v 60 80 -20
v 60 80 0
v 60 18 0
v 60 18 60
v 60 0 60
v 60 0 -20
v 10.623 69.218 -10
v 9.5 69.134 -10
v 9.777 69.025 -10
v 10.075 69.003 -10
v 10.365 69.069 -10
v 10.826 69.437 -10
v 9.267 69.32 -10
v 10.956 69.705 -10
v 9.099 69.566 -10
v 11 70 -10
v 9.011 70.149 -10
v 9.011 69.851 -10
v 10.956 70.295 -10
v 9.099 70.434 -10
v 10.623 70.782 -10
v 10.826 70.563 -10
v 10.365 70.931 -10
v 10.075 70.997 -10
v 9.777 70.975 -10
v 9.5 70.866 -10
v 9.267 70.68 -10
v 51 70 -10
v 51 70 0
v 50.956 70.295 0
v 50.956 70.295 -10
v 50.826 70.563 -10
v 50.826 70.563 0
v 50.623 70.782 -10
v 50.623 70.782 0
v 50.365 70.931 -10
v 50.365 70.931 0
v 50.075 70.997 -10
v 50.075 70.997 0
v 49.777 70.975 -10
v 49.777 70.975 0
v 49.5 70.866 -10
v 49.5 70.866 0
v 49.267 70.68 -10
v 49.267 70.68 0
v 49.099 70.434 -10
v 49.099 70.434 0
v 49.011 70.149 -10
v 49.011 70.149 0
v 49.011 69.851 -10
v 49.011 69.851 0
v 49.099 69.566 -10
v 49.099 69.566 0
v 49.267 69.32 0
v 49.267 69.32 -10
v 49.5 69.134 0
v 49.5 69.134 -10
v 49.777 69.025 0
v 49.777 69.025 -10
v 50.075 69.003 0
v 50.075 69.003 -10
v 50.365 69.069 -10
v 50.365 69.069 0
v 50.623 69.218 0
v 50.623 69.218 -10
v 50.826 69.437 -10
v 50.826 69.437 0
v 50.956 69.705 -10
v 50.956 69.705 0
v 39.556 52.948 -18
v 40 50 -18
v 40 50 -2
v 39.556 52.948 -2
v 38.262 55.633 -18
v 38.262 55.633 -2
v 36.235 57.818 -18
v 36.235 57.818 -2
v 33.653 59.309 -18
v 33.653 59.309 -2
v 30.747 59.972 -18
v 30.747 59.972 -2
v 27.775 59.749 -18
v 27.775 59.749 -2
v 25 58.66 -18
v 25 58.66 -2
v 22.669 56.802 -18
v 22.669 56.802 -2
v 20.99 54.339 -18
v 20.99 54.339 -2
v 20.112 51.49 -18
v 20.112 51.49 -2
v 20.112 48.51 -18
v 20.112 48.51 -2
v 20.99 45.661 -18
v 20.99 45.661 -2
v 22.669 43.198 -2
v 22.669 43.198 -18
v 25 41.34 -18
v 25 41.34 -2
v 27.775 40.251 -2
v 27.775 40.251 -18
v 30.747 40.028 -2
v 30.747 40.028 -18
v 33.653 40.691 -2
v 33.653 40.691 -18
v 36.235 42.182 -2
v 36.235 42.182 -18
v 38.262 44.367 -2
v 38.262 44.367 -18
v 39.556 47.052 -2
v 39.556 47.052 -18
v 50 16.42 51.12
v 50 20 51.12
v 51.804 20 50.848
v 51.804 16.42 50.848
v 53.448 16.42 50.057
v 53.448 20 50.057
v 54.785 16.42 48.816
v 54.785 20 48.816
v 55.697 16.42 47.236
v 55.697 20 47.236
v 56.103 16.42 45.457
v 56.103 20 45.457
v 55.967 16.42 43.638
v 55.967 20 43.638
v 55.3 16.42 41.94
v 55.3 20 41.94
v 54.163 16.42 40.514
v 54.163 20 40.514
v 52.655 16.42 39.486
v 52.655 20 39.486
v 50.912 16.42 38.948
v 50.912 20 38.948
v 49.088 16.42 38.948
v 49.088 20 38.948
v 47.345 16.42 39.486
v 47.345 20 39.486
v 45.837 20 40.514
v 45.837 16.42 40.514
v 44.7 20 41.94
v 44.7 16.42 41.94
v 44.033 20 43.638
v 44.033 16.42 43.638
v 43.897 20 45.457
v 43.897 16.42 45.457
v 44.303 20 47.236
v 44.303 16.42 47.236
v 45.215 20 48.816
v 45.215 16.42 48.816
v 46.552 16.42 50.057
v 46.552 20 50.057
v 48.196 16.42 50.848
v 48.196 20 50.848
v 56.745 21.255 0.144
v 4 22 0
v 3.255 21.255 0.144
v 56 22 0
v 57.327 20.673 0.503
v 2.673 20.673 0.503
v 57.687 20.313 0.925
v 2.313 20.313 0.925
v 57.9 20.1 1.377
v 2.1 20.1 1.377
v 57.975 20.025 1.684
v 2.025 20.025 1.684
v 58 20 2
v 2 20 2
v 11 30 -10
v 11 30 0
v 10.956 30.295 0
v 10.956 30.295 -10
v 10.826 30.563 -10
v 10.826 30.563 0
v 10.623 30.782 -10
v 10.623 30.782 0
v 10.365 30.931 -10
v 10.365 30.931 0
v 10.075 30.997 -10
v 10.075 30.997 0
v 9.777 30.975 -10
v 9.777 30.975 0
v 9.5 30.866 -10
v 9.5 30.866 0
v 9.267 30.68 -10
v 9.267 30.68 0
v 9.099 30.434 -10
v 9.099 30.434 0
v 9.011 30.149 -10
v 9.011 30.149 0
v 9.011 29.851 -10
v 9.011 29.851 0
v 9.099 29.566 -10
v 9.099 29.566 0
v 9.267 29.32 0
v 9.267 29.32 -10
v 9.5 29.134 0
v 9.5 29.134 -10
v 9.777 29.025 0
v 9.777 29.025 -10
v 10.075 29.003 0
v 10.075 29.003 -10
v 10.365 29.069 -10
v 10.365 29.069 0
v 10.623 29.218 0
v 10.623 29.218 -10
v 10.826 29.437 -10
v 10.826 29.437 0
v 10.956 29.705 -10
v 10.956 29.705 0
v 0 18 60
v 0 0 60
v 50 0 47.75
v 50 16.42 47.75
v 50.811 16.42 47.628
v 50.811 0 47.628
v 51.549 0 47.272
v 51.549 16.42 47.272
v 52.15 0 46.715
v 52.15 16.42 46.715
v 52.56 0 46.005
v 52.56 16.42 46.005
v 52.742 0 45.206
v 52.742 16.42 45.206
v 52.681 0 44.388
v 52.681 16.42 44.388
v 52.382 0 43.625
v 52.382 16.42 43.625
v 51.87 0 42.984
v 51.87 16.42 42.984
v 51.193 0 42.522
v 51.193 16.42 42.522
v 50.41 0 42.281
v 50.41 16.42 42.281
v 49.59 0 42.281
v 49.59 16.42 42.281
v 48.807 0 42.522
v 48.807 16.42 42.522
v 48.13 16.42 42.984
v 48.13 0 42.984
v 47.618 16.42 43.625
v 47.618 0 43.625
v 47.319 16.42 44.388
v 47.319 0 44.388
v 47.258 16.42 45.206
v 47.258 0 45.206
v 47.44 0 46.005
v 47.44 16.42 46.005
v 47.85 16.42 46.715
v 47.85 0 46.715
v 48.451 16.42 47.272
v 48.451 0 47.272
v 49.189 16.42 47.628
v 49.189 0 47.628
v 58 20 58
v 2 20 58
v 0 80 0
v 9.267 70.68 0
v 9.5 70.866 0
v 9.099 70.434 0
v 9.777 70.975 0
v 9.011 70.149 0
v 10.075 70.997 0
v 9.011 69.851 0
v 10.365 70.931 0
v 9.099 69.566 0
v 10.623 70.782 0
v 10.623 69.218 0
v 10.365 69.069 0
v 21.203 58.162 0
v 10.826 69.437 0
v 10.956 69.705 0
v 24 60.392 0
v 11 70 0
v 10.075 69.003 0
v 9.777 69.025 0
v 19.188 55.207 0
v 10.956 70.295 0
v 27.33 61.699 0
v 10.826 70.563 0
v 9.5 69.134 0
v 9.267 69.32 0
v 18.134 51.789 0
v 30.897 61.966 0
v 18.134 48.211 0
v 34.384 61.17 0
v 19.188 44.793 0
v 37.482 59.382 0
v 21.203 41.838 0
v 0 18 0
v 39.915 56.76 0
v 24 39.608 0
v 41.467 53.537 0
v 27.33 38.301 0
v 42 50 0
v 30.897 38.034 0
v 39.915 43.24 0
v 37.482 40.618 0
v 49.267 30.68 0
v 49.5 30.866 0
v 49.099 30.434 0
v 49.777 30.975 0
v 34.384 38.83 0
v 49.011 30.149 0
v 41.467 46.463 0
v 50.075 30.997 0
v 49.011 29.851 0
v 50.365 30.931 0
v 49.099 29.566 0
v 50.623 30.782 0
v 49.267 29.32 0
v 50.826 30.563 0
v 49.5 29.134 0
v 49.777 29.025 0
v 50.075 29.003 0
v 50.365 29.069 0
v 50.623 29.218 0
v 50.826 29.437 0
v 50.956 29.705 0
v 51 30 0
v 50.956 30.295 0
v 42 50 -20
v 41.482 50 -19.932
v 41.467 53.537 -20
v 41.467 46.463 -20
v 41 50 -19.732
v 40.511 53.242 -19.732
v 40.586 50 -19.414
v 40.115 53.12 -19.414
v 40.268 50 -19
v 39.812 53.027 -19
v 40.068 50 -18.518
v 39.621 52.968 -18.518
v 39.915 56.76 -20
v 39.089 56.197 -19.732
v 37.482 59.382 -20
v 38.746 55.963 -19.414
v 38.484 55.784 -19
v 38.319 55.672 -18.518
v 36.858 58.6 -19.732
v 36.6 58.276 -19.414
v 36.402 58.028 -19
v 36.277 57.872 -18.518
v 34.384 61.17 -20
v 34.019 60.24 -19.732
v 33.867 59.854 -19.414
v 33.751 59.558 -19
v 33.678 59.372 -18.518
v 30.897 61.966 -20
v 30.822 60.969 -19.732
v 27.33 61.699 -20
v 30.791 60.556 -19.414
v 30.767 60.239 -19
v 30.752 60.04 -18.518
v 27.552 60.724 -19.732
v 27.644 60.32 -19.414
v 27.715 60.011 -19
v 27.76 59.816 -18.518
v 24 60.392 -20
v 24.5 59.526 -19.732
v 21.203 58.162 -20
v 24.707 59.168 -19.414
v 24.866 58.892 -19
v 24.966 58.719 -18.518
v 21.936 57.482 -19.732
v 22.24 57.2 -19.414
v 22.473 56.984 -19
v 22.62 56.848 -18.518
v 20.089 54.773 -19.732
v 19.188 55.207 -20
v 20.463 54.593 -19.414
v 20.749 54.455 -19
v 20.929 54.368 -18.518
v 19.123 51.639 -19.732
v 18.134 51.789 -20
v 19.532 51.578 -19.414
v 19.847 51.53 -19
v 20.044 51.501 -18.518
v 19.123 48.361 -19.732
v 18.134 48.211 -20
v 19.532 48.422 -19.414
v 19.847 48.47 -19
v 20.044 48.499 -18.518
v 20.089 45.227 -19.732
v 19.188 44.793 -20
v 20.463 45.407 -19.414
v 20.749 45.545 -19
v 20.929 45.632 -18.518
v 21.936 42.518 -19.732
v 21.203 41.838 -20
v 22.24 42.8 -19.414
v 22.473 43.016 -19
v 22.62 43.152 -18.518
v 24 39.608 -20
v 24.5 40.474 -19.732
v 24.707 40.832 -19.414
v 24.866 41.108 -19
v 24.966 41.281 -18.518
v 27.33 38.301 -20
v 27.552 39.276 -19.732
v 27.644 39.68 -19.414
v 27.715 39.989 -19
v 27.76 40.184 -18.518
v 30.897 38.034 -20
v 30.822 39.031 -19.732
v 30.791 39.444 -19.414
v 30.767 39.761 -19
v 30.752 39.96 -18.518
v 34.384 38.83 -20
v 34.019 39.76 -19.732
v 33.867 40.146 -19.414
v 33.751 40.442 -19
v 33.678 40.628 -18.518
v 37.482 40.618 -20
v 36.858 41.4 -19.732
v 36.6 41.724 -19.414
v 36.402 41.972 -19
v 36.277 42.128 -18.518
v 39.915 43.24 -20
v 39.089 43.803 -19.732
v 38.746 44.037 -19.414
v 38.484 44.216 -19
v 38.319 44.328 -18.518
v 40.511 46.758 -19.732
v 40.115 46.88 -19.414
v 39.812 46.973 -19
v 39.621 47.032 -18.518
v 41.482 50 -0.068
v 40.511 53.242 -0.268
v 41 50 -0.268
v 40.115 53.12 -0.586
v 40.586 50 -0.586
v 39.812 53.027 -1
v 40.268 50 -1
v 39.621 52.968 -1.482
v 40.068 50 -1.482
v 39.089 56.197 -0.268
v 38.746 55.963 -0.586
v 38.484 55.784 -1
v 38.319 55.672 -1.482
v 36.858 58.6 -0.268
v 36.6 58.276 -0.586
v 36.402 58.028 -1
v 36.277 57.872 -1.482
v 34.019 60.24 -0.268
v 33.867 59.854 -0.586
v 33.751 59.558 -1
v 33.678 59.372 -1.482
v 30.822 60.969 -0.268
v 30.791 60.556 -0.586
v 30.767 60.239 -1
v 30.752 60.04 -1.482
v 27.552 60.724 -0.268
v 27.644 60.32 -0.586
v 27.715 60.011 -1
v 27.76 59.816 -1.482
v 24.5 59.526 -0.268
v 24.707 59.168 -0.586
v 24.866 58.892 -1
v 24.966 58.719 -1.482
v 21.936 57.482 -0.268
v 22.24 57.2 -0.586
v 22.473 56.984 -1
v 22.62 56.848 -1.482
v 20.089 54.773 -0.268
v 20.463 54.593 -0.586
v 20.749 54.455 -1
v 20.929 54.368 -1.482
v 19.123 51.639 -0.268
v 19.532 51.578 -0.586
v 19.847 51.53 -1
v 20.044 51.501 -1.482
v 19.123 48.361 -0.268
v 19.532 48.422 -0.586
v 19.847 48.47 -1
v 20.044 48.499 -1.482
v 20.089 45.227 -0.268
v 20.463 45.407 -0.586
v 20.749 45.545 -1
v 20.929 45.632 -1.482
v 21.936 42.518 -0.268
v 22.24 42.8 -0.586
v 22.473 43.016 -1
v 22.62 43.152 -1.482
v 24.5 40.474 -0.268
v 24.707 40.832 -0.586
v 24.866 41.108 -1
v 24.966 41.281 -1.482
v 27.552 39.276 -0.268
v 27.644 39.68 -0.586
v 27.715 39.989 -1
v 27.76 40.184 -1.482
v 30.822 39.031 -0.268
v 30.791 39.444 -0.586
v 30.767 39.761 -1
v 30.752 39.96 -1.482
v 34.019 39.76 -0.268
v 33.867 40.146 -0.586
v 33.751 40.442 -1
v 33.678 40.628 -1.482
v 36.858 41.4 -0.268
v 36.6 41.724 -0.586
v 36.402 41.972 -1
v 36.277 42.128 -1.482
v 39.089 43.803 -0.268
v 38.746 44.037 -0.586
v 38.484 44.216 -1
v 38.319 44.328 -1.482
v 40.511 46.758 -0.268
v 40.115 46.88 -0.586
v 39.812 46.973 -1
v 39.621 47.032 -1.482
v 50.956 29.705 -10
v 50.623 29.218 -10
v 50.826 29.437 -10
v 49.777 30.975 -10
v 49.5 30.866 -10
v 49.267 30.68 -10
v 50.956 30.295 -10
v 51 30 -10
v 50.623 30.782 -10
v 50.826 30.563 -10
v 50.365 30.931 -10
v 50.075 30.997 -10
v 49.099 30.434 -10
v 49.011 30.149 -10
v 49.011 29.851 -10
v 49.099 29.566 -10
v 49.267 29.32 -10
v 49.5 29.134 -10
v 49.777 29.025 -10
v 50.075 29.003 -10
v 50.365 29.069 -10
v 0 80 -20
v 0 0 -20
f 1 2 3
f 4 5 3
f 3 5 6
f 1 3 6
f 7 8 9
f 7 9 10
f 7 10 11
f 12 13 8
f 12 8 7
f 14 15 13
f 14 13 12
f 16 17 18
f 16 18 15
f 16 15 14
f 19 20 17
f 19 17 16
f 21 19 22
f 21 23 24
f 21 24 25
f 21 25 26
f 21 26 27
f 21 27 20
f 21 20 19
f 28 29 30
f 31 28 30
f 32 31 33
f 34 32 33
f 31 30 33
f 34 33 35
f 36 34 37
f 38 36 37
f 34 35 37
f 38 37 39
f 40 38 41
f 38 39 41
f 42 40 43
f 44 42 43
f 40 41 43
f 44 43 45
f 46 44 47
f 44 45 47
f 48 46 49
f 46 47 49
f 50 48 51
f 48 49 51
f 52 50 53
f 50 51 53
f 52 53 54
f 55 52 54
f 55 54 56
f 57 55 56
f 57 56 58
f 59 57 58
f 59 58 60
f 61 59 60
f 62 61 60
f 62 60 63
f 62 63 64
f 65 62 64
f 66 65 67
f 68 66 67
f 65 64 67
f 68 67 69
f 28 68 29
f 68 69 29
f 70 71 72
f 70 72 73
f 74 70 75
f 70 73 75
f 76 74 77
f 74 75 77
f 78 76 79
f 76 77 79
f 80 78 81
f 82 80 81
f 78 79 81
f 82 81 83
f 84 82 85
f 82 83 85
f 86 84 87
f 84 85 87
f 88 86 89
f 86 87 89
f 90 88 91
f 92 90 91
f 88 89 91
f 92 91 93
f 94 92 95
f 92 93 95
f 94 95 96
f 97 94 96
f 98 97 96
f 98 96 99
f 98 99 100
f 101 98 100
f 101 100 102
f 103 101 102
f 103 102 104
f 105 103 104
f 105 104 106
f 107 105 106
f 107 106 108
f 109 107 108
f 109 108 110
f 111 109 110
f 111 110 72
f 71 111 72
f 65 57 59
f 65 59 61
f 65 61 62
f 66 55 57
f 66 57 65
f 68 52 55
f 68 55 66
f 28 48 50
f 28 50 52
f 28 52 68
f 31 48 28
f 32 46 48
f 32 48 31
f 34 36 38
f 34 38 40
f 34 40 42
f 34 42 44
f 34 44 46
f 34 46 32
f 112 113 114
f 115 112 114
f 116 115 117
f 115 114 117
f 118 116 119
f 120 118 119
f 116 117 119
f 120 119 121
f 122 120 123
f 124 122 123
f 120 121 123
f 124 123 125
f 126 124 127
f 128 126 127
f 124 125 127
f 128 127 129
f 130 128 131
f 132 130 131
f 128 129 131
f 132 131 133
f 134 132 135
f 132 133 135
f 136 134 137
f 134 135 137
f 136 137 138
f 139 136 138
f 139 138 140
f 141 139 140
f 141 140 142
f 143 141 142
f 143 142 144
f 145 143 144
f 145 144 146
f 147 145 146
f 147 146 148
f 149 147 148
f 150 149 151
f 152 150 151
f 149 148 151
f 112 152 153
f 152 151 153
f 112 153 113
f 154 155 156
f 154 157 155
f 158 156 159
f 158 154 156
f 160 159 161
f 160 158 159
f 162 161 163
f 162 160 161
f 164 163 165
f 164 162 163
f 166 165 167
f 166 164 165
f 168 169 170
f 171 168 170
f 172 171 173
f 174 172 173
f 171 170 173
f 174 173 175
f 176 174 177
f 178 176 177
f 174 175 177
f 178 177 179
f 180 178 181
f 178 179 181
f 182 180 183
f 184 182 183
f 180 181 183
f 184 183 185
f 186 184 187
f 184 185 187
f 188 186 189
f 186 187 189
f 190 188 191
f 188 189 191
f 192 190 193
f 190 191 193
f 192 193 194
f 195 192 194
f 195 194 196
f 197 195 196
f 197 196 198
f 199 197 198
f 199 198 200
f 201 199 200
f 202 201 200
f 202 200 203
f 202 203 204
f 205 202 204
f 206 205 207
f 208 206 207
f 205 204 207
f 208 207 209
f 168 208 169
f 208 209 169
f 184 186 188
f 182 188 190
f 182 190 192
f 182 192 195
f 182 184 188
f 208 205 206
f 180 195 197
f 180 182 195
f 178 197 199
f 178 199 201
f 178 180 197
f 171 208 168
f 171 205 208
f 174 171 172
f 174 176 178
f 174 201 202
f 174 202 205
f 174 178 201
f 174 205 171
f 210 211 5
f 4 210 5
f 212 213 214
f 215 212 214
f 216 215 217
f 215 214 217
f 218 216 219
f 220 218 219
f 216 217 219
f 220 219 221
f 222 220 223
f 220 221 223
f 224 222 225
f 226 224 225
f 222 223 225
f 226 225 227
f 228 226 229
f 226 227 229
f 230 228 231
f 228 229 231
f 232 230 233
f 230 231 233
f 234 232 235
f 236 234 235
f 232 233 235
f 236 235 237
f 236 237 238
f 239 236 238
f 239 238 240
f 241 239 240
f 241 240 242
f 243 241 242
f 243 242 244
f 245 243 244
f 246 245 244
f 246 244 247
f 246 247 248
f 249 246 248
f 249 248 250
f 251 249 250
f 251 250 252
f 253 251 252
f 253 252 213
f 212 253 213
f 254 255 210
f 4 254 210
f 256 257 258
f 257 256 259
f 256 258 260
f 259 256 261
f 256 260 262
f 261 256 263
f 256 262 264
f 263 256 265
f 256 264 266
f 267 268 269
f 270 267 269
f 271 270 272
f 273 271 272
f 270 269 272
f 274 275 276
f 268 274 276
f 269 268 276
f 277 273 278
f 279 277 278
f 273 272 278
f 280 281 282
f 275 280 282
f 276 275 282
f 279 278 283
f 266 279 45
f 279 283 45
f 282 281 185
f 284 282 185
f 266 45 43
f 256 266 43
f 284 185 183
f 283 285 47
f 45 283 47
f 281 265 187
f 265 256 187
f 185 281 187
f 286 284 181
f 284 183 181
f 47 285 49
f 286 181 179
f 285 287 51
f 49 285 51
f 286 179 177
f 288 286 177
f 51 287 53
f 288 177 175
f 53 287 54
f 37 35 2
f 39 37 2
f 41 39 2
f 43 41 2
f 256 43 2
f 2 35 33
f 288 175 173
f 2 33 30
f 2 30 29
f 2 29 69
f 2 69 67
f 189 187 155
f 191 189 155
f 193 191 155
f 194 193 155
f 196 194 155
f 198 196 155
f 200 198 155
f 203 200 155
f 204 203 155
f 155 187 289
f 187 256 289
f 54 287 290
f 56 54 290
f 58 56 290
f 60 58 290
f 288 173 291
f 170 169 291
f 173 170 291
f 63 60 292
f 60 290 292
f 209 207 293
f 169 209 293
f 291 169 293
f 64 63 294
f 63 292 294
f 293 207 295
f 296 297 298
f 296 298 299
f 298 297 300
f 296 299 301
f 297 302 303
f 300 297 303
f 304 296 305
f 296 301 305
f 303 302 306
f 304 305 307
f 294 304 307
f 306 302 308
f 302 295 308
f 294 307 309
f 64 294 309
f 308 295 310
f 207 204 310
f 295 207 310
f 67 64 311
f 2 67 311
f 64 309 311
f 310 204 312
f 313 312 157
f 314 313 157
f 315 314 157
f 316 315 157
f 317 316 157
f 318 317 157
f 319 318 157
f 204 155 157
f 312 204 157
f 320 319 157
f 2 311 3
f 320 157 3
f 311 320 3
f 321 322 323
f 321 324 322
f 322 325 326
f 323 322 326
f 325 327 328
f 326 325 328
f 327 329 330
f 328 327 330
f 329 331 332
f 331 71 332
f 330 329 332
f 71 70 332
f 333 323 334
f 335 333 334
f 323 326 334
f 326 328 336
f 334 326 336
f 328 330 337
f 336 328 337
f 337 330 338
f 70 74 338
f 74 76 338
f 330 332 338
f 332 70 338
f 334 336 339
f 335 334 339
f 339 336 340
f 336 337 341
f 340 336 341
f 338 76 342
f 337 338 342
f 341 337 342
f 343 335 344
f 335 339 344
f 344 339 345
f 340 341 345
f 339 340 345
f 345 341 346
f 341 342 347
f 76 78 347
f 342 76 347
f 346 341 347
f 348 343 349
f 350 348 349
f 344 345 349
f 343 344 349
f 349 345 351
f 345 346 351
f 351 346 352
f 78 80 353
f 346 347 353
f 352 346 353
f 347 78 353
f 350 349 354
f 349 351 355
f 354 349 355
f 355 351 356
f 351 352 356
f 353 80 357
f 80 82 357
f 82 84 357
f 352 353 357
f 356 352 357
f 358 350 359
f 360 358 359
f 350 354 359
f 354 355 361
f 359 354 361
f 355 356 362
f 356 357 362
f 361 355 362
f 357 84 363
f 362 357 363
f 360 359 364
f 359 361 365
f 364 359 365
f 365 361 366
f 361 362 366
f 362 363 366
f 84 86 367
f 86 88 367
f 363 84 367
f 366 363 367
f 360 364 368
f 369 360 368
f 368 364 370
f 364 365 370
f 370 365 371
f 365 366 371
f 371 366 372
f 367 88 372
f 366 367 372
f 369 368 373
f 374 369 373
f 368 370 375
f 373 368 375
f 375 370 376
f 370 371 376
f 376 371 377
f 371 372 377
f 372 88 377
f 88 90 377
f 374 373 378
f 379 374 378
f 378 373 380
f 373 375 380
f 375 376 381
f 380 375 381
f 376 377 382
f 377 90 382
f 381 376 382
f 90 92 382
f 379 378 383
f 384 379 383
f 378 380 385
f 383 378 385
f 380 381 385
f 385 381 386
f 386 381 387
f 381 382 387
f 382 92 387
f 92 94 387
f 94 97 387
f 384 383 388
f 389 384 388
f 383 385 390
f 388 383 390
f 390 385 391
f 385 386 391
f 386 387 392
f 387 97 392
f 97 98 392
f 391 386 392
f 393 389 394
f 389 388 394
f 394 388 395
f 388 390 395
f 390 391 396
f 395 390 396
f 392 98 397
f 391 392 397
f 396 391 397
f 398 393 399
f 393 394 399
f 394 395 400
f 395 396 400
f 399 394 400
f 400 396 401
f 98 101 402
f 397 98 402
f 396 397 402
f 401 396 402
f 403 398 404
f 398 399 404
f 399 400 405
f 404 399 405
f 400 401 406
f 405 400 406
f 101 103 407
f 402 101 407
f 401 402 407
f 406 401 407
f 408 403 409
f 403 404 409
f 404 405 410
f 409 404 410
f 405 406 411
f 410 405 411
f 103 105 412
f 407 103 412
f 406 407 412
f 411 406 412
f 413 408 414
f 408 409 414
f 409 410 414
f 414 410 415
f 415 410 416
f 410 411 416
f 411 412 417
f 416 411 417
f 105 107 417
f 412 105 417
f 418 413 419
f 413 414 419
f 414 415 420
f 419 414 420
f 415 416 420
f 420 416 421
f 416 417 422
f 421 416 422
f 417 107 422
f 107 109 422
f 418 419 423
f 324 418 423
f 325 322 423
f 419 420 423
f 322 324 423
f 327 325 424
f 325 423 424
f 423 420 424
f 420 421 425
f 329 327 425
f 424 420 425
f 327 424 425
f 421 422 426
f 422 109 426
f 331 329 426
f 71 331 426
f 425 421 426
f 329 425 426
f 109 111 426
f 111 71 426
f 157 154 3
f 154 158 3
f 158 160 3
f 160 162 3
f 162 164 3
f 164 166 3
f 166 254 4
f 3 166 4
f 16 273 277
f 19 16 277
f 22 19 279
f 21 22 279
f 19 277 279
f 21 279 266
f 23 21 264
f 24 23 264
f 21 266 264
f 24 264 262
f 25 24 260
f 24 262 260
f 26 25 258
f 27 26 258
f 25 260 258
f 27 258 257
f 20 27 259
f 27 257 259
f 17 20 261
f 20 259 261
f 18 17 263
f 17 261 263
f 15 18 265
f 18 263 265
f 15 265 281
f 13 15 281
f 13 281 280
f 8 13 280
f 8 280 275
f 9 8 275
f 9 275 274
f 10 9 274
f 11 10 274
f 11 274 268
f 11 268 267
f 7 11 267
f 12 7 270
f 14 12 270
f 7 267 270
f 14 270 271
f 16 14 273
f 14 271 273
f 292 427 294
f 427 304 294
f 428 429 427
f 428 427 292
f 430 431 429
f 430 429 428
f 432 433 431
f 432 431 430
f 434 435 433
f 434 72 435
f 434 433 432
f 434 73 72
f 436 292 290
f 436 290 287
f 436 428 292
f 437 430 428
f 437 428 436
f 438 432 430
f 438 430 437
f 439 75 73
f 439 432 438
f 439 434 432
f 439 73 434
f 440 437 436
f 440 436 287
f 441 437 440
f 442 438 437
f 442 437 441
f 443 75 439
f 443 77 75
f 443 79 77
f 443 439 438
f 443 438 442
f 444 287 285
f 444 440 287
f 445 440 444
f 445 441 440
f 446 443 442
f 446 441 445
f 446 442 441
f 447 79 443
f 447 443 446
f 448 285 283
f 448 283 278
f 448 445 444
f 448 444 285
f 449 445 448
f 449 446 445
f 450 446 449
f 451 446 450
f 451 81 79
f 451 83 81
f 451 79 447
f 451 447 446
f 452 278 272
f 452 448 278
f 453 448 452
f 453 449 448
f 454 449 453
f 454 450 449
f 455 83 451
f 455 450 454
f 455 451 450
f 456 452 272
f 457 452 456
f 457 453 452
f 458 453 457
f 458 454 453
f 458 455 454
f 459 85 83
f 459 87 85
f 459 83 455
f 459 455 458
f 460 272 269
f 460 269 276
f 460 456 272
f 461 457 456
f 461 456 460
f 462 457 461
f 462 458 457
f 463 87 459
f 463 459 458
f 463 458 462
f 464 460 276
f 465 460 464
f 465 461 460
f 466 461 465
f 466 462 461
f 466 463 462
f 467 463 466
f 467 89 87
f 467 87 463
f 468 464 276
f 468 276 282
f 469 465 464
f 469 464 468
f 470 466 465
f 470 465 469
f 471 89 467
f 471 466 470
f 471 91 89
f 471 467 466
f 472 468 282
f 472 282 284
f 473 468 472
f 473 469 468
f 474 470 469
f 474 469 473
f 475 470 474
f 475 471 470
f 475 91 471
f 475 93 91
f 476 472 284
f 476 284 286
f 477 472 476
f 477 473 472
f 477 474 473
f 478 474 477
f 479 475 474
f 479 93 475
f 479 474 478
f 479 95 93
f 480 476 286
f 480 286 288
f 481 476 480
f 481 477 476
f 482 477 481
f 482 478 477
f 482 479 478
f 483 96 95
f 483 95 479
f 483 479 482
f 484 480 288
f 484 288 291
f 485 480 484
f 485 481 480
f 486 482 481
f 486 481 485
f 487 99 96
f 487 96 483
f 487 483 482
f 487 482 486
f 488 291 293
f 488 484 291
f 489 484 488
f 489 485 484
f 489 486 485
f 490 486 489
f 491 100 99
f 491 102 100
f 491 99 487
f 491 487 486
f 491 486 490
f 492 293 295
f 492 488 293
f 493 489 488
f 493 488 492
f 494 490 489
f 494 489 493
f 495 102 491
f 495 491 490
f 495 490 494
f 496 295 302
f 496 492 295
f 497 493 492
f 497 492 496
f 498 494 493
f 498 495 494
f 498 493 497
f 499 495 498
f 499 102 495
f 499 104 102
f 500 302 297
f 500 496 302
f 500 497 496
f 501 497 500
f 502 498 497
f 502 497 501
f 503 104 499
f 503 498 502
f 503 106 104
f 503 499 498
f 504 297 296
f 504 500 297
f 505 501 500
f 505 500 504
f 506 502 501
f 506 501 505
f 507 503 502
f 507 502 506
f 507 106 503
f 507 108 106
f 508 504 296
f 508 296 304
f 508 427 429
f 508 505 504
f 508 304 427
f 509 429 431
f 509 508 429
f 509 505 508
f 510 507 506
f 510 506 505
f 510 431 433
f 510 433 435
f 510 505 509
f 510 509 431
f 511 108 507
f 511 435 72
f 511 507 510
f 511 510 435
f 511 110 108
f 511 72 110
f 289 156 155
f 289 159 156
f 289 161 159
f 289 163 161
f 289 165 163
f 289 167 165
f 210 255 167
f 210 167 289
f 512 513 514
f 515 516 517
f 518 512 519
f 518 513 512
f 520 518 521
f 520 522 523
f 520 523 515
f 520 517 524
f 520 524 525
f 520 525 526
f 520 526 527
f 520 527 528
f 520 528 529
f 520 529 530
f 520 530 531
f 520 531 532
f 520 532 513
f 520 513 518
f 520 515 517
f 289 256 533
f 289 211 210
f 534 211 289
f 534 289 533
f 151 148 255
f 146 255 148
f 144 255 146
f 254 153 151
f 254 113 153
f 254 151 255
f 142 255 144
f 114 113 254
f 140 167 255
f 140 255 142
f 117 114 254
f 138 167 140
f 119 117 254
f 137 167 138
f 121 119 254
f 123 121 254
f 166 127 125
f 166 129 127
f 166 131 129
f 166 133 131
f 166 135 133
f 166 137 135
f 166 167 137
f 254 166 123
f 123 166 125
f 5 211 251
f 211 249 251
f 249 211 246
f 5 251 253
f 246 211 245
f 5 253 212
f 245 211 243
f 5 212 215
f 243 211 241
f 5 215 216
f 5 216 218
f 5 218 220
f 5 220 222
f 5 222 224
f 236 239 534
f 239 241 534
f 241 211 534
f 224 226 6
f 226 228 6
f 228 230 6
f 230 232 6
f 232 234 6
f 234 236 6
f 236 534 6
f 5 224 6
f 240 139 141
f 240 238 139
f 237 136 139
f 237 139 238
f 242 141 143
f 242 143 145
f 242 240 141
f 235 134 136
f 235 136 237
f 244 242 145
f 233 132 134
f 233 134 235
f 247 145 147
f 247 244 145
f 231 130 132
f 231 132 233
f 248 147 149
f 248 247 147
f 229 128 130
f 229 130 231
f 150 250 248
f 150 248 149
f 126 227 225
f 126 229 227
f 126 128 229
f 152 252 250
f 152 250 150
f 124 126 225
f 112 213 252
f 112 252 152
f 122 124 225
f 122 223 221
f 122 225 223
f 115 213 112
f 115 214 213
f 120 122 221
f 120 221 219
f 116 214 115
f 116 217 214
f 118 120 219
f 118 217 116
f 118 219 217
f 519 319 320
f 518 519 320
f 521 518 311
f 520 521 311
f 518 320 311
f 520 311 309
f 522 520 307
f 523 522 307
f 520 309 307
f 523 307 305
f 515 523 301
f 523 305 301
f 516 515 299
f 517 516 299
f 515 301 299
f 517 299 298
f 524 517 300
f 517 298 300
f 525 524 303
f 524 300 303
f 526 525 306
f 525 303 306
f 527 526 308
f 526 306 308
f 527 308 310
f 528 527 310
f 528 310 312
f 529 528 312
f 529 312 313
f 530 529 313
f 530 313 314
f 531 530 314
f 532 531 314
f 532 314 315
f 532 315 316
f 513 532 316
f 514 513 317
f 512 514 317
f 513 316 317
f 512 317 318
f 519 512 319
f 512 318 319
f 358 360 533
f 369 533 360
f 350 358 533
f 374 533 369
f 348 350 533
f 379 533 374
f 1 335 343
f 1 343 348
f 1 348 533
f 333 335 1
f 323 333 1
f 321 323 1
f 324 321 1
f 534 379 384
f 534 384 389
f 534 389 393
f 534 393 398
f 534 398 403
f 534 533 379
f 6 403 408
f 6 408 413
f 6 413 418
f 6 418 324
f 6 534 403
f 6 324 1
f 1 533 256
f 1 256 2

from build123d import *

# Parameters (mm, degrees)
SKETCH1_W           = 60
SKETCH1_H           = 60
BOSS_EXTRUDE1_DEPTH = 20
SKETCH1_3_W         = 60
SKETCH1_3_H         = 20
BOSS_EXTRUDE2_DEPTH = 80
SKETCH3_R           = 10
CUT_EXTRUDE2_DEPTH  = 117.619037897
FILLET2_R           = 2
SKETCH4_R           = 1
CUT_EXTRUDE3_DEPTH  = 10
SKETCH7_R           = 6.12
CUT_EXTRUDE5_DEPTH  = 3.58
SKETCH8_R           = 2.75
CUT_EXTRUDE6_DEPTH  = 107.030261718
CUT_EXTRUDE7_DEPTH  = 60
FILLET7_R           = 2
CUT_EXTRUDE13_DEPTH = 60


with BuildPart() as part:
    # Sketch1 → Boss-Extrude1 (new body)
    with BuildSketch(Plane(origin=(0, 0, 0), x_dir=(1, 0, 0), z_dir=(0, 1, 0))):
        with Locations((30, -30)):
            Rectangle(SKETCH1_W, SKETCH1_H)
    extrude(amount=BOSS_EXTRUDE1_DEPTH)

    # Sketch1<3> → Boss-Extrude2 (add)
    with BuildSketch(Plane(origin=(0, 0, 0), x_dir=(1, 0, 0), z_dir=(0, 1, 0))):
        with Locations((30, 10)):
            Rectangle(SKETCH1_3_W, SKETCH1_3_H)
    extrude(amount=BOSS_EXTRUDE2_DEPTH)

    # Sketch3 → Cut-Extrude2 (cut, through all)
    with BuildSketch(Plane.XY):
        with Locations((30, 50)):
            Circle(SKETCH3_R)
    extrude(amount=-CUT_EXTRUDE2_DEPTH, mode=Mode.SUBTRACT)

    # Fillet2
    fillet2_edges = [part.edges().sort_by_distance(p)[0] for p in [
        (20, 50, -20),
        (20, 50, 0),
    ]]
    fillet(fillet2_edges, radius=FILLET2_R)

    # Sketch4 → Cut-Extrude3 (cut)
    with BuildSketch(Plane.XY):
        with Locations((10, 70)):
            Circle(SKETCH4_R)
        with Locations((50, 70)):
            Circle(SKETCH4_R)
        with Locations((50, 30)):
            Circle(SKETCH4_R)
        with Locations((10, 30)):
            Circle(SKETCH4_R)
    extrude(amount=-CUT_EXTRUDE3_DEPTH, mode=Mode.SUBTRACT)

    # Sketch7 → Cut-Extrude5 (cut)
    with BuildSketch(Plane(origin=(0, 20, 0), x_dir=(1, 0, 0), z_dir=(0, 1, 0))):
        with Locations((50, -45)):
            Circle(SKETCH7_R)
    extrude(amount=-CUT_EXTRUDE5_DEPTH, mode=Mode.SUBTRACT)

    # Sketch8 → Cut-Extrude6 (cut, through all)
    with BuildSketch(Plane(origin=(0, 16.42, 0), x_dir=(1, 0, 0), z_dir=(0, 1, 0))):
        with Locations((50, -45)):
            Circle(SKETCH8_R)
    extrude(amount=-CUT_EXTRUDE6_DEPTH, mode=Mode.SUBTRACT)

    # Sketch9 → Cut-Extrude7 (cut)
    with BuildSketch(Plane.XY.offset(60)):
        Polygon((0, 20), (2, 20), (0, 18), align=None)
        Polygon((60, 20), (58, 20), (60, 18), align=None)
    extrude(amount=-CUT_EXTRUDE7_DEPTH, mode=Mode.SUBTRACT)

    # Fillet7
    fillet7_edges = [part.edges().sort_by_distance(p)[0] for p in [
        (30, 20, 0),
    ]]
    fillet(fillet7_edges, radius=FILLET7_R)

    # Sketch11 → Cut-Extrude13 (cut)
    with BuildSketch(Plane(origin=(60, 0, 0), x_dir=(0, 0, -1), z_dir=(1, 0, 0))):
        Polygon((-60, 20), (-58, 20), (-60, 18), align=None)
    extrude(amount=-CUT_EXTRUDE13_DEPTH, mode=Mode.SUBTRACT)


solid = part.part
